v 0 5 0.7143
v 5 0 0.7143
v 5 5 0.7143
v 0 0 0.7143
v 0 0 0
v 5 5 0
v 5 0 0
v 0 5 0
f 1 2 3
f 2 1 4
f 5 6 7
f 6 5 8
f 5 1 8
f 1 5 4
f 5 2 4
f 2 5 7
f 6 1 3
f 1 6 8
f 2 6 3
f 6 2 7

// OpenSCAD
// file: hollowvoxels.scad
//wt = wall thickness
module hunitcube(wt) {
	diff = 2*wt;
	cube([1,1,1]);
	translate([wt,wt,wt])
	scale([1-diff,1-diff,1-diff])
	cube([1,1,1]);
}

module hcube(v=[1,1,1], wt) {
	for (i=[0:v[0]-1]) {
	for (j=[0:v[1]-1]) {
	for (k=[0:v[2]-1]) {
		translate([i,j,k])
		hunitcube(wt);
	}
	}
	}
}

module hcubefivesevenths(v=[1,1,1]) {
	hcube(v, 0.1*7/5);
}
// main file
use <hollowvoxels.scad>;

scale([5/7,5/7,5/7])
hcubefivesevenths([7,7,1]);
